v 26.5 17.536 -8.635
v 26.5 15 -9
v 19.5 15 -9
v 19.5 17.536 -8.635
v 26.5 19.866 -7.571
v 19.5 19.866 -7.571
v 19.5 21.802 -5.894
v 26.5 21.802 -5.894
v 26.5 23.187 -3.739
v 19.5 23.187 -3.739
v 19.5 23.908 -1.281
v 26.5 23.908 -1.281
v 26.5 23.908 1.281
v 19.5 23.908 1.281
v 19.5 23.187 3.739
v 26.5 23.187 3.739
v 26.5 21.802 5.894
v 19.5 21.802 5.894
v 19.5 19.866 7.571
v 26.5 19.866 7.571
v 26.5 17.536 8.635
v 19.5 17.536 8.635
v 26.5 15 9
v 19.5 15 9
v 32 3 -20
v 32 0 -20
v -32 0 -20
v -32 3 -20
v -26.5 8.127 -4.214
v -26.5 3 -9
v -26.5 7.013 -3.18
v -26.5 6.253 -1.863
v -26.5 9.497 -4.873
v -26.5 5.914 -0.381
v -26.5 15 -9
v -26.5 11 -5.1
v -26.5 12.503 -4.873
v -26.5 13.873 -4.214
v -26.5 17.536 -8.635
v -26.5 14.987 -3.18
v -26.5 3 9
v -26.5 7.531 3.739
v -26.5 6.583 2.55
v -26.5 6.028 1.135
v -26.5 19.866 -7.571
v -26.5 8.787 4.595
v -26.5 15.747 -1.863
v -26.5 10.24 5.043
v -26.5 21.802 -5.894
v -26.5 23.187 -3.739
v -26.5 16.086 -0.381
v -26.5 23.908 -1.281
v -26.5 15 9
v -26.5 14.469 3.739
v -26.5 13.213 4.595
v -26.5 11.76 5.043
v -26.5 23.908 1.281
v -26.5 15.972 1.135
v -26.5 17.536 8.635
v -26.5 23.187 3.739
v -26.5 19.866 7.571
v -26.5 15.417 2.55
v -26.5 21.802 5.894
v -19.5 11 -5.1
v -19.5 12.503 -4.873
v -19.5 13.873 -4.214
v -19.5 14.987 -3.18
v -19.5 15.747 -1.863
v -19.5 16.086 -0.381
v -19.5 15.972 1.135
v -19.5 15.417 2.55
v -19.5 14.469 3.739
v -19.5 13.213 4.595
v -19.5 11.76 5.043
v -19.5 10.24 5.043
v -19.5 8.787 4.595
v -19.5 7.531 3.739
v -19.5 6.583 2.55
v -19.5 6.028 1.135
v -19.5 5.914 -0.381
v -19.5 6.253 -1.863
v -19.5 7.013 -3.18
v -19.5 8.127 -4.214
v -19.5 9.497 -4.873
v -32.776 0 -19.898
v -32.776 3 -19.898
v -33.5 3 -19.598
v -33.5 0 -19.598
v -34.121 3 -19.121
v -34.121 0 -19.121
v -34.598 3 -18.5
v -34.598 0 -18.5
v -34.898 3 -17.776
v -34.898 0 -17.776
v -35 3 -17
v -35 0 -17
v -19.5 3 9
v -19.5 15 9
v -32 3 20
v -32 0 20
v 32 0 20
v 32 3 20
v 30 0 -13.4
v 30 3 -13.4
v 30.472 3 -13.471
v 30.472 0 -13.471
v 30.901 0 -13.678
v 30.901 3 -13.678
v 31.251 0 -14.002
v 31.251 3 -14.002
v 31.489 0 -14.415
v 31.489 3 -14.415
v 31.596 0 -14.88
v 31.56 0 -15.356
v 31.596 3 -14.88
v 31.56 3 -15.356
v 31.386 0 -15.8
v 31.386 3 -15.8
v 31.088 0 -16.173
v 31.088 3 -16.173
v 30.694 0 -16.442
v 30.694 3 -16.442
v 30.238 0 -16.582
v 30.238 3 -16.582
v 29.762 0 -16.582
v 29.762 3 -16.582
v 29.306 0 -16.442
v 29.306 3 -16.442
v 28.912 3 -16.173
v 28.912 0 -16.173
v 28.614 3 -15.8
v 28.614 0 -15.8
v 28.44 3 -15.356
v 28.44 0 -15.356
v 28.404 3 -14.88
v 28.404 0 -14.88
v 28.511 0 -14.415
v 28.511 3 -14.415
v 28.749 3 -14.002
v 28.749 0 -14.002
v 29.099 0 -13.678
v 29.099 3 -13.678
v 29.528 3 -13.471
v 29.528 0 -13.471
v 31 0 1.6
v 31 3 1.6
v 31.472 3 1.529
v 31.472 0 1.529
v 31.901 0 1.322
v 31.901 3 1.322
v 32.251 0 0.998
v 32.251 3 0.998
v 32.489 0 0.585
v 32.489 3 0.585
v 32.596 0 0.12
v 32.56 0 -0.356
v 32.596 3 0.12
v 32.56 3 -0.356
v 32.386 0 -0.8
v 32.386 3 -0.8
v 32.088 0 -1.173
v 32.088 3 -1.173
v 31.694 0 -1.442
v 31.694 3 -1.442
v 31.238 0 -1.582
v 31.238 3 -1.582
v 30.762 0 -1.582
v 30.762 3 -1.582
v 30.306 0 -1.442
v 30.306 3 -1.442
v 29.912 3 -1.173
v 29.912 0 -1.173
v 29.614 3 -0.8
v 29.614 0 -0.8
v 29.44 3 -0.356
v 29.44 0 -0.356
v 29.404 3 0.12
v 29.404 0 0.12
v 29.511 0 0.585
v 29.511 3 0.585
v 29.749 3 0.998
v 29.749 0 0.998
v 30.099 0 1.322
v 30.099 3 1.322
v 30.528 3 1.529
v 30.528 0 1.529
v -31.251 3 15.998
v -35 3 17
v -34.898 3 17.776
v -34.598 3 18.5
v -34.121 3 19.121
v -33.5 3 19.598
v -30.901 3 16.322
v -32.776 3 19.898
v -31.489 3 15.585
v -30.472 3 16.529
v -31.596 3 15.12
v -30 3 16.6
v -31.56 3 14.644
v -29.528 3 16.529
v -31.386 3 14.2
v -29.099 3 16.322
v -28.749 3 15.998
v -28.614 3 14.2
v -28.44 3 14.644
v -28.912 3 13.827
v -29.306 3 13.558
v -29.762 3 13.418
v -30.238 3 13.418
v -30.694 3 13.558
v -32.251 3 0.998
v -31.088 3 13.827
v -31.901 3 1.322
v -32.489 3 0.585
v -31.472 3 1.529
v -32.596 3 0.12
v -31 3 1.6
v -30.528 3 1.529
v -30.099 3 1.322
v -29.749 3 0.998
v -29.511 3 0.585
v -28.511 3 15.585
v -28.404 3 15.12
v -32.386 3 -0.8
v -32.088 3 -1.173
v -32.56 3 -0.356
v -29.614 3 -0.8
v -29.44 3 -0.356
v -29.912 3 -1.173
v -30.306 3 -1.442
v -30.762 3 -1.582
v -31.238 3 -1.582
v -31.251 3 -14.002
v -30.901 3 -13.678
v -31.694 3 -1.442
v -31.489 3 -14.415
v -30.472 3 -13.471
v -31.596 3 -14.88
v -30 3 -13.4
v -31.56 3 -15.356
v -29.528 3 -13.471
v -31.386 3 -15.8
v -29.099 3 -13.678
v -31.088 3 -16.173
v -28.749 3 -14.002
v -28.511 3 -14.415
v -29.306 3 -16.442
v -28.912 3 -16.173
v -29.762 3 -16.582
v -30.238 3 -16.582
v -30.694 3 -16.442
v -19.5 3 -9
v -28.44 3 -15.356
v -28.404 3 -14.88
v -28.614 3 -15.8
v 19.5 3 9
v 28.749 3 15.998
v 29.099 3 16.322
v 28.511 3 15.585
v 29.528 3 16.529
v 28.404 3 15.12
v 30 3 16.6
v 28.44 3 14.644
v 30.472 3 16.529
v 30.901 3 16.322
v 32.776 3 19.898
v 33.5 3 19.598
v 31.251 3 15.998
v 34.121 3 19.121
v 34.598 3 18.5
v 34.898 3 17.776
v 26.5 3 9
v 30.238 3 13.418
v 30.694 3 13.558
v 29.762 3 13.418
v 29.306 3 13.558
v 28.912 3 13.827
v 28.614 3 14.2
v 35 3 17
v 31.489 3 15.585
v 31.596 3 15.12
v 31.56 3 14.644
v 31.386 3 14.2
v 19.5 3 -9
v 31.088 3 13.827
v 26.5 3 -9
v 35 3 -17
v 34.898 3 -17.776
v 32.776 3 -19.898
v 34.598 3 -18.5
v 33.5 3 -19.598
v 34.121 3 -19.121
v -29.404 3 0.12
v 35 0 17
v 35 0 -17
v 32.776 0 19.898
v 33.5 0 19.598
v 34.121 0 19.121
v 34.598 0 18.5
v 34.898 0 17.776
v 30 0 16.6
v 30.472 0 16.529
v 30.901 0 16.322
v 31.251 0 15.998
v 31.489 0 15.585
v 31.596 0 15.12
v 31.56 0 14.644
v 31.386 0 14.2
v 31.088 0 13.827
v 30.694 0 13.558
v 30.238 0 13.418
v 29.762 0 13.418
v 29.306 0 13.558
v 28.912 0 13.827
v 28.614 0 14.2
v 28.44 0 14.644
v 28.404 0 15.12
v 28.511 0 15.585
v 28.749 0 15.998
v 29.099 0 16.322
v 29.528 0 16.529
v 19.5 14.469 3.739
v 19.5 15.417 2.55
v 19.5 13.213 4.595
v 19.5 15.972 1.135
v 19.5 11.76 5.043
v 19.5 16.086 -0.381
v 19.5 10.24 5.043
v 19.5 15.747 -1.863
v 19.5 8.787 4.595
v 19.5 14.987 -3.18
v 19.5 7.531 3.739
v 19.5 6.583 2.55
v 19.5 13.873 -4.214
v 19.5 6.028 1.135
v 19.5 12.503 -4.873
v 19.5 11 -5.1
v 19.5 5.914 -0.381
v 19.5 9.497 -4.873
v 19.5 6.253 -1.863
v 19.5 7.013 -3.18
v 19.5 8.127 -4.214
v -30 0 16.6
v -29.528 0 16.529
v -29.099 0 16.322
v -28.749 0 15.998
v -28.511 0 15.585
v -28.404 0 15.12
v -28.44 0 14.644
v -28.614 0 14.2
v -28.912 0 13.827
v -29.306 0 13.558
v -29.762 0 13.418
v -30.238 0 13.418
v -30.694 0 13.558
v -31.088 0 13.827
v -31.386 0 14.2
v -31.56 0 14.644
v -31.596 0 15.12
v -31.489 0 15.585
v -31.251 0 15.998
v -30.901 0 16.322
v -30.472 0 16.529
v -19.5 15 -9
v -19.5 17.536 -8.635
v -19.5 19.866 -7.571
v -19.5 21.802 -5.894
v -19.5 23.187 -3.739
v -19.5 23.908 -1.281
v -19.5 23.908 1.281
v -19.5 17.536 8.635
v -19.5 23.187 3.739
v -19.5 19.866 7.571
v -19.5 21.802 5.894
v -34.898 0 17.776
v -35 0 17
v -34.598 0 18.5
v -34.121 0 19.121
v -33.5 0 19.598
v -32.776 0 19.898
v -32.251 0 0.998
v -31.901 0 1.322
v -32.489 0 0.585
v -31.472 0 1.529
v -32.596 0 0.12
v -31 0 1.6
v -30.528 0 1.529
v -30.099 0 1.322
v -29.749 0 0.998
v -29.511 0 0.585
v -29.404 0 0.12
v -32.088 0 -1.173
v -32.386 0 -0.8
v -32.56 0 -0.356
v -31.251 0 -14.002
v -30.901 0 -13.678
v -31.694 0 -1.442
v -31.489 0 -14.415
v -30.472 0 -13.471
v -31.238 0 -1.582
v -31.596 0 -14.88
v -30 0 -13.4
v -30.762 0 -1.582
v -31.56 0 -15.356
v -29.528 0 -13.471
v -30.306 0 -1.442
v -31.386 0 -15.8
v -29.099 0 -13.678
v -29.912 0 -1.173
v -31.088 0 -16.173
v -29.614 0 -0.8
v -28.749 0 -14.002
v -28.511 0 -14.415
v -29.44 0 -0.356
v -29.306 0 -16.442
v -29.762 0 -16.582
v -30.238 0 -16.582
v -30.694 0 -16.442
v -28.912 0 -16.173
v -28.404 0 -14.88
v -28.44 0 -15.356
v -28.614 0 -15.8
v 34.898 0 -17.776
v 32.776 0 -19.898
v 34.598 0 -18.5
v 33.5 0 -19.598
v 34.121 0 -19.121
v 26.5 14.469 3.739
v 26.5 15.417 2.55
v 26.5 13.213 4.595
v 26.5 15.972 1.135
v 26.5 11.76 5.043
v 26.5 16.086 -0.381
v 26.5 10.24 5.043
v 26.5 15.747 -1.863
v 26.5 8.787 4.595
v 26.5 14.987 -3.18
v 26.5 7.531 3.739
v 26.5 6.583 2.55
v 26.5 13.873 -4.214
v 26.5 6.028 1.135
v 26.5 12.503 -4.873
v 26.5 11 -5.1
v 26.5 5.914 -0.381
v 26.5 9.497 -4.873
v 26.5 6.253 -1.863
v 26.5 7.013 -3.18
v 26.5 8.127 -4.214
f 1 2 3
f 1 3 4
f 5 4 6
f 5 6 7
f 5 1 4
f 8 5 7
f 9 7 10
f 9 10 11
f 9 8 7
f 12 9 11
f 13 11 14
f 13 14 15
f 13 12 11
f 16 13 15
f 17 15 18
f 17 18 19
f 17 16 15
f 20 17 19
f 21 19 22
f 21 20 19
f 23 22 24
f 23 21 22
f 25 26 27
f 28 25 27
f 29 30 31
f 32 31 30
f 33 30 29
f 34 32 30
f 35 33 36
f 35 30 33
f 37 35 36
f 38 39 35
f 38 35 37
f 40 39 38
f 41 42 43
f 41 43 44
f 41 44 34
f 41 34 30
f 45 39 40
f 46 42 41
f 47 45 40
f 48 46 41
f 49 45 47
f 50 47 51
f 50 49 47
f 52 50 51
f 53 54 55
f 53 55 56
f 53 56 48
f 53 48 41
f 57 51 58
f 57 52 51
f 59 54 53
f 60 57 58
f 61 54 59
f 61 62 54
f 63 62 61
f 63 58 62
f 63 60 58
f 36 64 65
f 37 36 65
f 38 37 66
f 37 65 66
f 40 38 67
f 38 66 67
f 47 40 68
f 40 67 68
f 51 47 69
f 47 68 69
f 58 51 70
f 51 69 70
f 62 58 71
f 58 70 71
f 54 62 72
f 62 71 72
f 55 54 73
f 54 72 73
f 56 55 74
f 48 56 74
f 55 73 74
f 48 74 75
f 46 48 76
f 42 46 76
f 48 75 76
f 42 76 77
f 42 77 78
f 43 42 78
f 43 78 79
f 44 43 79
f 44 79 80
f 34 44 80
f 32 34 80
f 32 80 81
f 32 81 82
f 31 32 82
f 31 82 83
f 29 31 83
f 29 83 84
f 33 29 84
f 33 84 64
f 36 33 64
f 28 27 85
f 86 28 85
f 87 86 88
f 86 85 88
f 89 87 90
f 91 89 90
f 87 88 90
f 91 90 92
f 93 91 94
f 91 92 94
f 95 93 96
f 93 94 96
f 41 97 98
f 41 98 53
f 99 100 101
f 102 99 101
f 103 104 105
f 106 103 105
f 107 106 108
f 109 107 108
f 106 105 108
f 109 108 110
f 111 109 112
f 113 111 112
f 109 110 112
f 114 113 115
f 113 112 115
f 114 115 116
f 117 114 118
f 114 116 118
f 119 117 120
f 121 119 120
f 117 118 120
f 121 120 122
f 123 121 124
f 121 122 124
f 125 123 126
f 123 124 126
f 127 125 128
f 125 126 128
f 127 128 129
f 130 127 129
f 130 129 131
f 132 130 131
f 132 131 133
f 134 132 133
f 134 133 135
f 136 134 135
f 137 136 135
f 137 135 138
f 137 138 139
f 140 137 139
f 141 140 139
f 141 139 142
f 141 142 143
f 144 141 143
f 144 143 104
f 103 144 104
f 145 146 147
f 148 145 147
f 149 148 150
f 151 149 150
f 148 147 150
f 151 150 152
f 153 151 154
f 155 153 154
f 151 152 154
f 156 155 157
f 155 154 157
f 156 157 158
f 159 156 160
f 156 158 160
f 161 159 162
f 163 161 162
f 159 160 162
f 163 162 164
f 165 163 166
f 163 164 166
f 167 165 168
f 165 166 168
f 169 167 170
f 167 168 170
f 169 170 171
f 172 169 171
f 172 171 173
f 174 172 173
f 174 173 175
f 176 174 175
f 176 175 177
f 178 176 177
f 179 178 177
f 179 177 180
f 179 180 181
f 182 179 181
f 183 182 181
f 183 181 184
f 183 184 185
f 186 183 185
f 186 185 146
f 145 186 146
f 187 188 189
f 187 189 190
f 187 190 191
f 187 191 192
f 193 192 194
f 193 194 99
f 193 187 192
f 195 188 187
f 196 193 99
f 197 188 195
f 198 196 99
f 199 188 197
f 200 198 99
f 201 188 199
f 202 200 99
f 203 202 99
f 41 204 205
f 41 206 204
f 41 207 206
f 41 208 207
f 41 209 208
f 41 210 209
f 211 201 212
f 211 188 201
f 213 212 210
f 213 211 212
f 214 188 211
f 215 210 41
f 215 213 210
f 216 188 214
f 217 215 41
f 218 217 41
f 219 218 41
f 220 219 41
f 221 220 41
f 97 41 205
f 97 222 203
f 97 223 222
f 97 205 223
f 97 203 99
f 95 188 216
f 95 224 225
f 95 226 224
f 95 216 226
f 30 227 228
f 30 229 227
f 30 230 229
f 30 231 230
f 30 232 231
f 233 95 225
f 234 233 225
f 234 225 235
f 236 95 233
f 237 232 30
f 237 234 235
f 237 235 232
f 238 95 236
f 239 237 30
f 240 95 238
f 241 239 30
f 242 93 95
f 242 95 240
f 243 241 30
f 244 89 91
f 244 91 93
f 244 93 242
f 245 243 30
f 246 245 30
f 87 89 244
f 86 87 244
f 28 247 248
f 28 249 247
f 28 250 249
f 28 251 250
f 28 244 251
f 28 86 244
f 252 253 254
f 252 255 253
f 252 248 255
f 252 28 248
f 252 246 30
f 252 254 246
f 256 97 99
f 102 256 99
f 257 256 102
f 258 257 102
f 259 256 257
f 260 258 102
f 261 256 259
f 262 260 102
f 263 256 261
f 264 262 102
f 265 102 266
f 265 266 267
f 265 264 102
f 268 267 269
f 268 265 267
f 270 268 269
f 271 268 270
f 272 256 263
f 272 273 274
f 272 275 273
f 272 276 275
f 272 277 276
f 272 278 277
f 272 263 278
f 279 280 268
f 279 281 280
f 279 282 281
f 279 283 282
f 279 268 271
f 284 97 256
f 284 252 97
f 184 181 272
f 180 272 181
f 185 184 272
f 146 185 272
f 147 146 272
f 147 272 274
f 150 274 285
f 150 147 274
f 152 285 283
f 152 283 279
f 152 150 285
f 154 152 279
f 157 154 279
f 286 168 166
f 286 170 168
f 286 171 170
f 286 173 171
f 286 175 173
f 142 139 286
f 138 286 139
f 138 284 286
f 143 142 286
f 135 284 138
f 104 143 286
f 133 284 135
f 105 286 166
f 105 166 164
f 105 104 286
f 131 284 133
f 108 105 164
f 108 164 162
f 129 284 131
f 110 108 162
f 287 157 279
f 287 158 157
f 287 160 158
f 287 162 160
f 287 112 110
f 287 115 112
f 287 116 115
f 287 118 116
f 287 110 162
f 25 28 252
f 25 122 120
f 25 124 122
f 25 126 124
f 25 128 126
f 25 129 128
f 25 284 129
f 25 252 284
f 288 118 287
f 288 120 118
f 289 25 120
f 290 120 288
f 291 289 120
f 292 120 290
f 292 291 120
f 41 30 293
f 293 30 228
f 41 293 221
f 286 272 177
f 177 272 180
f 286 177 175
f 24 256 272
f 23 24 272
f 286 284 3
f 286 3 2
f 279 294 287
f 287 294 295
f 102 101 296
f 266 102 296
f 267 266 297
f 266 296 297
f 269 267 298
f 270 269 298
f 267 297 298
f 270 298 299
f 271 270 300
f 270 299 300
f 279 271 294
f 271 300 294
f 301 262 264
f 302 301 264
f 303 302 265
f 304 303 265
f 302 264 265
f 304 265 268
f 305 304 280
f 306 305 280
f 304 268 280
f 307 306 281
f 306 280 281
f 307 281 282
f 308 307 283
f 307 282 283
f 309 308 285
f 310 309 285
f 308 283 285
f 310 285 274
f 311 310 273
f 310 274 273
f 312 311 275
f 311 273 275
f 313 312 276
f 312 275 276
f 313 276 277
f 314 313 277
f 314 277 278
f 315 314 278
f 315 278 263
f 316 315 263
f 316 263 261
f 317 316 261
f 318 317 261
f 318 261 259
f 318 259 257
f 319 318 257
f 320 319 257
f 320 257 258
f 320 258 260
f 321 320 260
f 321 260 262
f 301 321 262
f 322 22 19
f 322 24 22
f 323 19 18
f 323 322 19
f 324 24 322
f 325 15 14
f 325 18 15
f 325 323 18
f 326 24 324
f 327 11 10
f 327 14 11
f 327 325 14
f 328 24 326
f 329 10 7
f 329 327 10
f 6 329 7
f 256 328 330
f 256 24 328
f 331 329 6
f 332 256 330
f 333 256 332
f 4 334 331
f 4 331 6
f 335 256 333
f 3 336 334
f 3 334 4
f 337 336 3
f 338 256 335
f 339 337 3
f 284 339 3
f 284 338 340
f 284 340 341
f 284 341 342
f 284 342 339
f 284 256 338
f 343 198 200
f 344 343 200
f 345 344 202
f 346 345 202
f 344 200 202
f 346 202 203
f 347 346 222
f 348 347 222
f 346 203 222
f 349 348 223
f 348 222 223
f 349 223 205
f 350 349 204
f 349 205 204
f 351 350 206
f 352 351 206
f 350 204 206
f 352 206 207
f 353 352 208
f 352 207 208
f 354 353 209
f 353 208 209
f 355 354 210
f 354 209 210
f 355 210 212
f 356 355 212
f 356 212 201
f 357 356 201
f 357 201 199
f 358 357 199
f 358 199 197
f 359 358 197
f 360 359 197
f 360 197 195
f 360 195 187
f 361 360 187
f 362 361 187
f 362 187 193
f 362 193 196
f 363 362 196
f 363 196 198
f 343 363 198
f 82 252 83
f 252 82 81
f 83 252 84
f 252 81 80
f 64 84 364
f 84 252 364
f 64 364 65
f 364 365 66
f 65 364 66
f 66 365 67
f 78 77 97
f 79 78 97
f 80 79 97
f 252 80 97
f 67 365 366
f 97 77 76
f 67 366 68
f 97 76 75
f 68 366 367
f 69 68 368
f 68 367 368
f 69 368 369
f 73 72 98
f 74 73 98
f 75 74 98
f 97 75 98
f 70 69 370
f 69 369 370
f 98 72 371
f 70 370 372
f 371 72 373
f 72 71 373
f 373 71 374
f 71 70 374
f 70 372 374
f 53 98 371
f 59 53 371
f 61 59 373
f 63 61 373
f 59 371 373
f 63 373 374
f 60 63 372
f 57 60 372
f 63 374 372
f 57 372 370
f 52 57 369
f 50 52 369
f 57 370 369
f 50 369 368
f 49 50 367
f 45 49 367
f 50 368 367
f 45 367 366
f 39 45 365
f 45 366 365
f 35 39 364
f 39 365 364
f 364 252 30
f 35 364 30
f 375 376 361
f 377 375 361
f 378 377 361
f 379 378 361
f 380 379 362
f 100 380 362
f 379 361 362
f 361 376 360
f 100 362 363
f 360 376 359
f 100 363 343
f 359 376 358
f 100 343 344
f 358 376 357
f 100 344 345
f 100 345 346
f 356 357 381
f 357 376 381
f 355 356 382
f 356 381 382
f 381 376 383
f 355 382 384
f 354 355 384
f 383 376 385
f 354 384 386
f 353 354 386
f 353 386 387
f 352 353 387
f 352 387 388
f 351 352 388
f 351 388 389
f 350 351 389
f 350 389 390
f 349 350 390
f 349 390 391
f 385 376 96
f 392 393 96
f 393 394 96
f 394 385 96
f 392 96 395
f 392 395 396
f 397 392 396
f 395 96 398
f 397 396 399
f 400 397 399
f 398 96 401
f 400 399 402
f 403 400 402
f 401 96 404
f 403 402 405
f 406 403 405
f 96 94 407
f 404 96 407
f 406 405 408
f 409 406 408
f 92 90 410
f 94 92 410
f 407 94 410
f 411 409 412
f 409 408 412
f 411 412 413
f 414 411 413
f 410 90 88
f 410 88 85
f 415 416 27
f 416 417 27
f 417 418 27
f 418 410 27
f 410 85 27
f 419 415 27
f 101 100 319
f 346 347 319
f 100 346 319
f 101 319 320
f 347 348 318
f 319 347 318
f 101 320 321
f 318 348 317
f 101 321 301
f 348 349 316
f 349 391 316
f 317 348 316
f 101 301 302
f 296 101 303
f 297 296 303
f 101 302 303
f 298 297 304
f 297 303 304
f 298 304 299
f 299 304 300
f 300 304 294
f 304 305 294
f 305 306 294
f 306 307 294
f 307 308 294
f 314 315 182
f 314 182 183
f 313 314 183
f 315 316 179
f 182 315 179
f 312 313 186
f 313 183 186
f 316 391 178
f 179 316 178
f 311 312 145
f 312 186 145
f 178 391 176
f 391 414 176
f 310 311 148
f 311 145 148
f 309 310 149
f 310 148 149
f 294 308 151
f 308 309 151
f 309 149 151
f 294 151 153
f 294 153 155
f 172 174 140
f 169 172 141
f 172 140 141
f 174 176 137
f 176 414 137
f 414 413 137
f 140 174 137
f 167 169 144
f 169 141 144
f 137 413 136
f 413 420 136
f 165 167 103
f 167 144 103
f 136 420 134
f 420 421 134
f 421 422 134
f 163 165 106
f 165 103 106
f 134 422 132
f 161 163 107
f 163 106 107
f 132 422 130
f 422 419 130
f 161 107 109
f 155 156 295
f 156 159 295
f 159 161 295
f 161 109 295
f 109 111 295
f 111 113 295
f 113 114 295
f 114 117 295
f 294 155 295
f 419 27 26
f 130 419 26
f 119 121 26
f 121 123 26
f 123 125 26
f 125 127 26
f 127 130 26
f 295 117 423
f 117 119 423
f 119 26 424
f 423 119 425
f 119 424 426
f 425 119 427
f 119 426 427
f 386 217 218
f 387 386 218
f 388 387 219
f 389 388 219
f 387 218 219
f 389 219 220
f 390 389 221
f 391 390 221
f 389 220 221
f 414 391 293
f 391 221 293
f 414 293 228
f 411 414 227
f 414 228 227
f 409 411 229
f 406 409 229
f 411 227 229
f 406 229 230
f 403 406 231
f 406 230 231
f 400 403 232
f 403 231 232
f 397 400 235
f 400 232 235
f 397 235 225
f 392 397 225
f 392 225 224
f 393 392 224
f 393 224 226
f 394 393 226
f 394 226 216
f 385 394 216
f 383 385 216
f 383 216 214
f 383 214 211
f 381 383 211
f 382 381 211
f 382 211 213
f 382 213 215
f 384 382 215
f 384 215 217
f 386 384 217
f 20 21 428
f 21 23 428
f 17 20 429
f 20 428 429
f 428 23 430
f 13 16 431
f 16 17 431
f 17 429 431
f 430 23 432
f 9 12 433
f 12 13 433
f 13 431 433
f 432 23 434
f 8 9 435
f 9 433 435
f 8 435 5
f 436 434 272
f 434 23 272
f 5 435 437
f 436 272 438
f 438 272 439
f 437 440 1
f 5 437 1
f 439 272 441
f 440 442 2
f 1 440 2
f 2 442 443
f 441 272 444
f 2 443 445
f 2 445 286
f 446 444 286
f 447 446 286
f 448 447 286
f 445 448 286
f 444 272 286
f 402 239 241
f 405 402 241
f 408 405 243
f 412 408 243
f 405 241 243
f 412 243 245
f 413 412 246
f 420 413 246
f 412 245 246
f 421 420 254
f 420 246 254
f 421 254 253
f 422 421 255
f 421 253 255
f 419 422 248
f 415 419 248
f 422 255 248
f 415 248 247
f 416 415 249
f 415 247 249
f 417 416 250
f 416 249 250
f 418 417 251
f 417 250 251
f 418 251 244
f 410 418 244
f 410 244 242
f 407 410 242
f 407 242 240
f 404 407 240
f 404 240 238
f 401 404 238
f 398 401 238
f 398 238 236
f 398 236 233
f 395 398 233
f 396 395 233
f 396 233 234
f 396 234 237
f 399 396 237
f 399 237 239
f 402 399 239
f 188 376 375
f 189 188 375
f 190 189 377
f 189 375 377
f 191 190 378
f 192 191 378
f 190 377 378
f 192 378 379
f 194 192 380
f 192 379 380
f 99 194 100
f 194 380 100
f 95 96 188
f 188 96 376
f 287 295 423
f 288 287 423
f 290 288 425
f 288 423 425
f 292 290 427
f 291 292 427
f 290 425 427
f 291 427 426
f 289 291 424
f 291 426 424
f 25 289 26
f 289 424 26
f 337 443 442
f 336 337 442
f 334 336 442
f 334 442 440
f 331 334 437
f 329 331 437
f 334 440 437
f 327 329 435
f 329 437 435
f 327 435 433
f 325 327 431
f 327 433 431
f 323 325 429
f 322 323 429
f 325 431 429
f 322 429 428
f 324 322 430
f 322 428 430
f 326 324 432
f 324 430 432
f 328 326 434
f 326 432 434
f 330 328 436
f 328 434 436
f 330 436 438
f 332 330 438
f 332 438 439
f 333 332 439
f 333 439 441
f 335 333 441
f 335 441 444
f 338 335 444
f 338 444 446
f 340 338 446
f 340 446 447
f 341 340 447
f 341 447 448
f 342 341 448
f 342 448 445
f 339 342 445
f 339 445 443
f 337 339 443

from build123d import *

# Parameters (mm, degrees)
EXTRUDE_1_DEPTH     = 3
SKETCH_2_W          = 7
SKETCH_2_H          = 18
EXTRUDE_2_DEPTH     = 12
SKETCH_3_R          = 9
EXTRUDE_3_DEPTH     = 7
EXTRUDE_START       = -7
SKETCH_4_R          = 9
EXTRUDE_4_DEPTH     = 7
SKETCH_5_R          = 5
CUT_EXTRUDE_1_DEPTH = 69.980069585
SKETCH_6_R          = 1.6
CUT_EXTRUDE_2_DEPTH = 46.453272709
SKETCH_7_R          = 1.6
CUT_EXTRUDE_3_DEPTH = 10
SKETCH_8_R          = 5.1
CUT_EXTRUDE_4_DEPTH = 69.980069585


with BuildPart() as part:
    # 草图1 → 凸台-拉伸1 (new body)
    with BuildSketch(Plane(origin=(0, 0, 0), x_dir=(1, 0, 0), z_dir=(0, 1, 0))):
        with BuildLine():
            Line((-32, -20), (32, -20))
            ThreePointArc((32, -20), (34.121320344, -19.121320344), (35, -17))
            Line((35, -17), (35, 17))
            ThreePointArc((35, 17), (34.121320344, 19.121320344), (32, 20))
            Line((32, 20), (-32, 20))
            ThreePointArc((-32, 20), (-34.121320344, 19.121320344), (-35, 17))
            Line((-35, 17), (-35, -17))
            ThreePointArc((-35, -17), (-34.121320344, -19.121320344), (-32, -20))
        make_face()
    extrude(amount=EXTRUDE_1_DEPTH)

    # 草图2 → 凸台-拉伸2 (add)
    with BuildSketch(Plane(origin=(0, 3, 0), x_dir=(1, 0, 0), z_dir=(0, 1, 0))):
        with Locations((23, 0)):
            Rectangle(SKETCH_2_W, SKETCH_2_H)
    extrude_2 = extrude(amount=EXTRUDE_2_DEPTH)

    # 镜向1: 凸台-拉伸2 across plane
    add(extrude_2.mirror(Plane(origin=(0, 0, 0), x_dir=(0, 0, 1), z_dir=(1, 0, 0))))

    # 草图3 → 凸台-拉伸3 (add)
    with BuildSketch(Plane(origin=(26.5, 0, 0), x_dir=(0, 0, -1), z_dir=(1, 0, 0))):
        with Locations((0, 15)):
            Circle(SKETCH_3_R)
    extrude(amount=-EXTRUDE_3_DEPTH)

    # 草图4 → 凸台-拉伸4 (add)
    with BuildSketch(Plane.ZY.offset(26.5).offset(EXTRUDE_START)):
        with Locations((0, 15)):
            Circle(SKETCH_4_R)
    extrude(amount=EXTRUDE_4_DEPTH)

    # 草图5 → 切除-拉伸1 (cut, through all)
    with BuildSketch(Plane(origin=(26.5, 0, 0), x_dir=(0, 0, -1), z_dir=(1, 0, 0))):
        with Locations((0, 11)):
            Circle(SKETCH_5_R)
    extrude(amount=-CUT_EXTRUDE_1_DEPTH, mode=Mode.SUBTRACT)

    # 草图6 → 切除-拉伸2 (cut, through all)
    with BuildSketch(Plane(origin=(0, 3, 0), x_dir=(1, 0, 0), z_dir=(0, 1, 0))):
        with Locations(Location((-31, 0, 0), (0, 0, 270))):
            Circle(SKETCH_6_R)
        with Locations(Location((31, 0, 0), (0, 0, 270))):
            Circle(SKETCH_6_R)
    extrude(amount=-CUT_EXTRUDE_2_DEPTH, mode=Mode.SUBTRACT)

    # 草图7 → 切除-拉伸3 (cut)
    with BuildSketch(Plane(origin=(0, 3, 0), x_dir=(1, 0, 0), z_dir=(0, 1, 0))):
        with Locations(Location((-30, 15, 0), (0, 0, 270))):
            Circle(SKETCH_7_R)
        with Locations(Location((30, 15, 0), (0, 0, 270))):
            Circle(SKETCH_7_R)
        with Locations(Location((30, -15, 0), (0, 0, 270))):
            Circle(SKETCH_7_R)
        with Locations(Location((-30, -15, 0), (0, 0, 270))):
            Circle(SKETCH_7_R)
    extrude(amount=-CUT_EXTRUDE_3_DEPTH, mode=Mode.SUBTRACT)

    # 草图8 → 切除-拉伸4 (cut, through all)
    with BuildSketch(Plane(origin=(26.5, 0, 0), x_dir=(0, 0, -1), z_dir=(1, 0, 0))):
        with Locations((0, 11)):
            Circle(SKETCH_8_R)
    extrude(amount=-CUT_EXTRUDE_4_DEPTH, mode=Mode.SUBTRACT)


solid = part.part
